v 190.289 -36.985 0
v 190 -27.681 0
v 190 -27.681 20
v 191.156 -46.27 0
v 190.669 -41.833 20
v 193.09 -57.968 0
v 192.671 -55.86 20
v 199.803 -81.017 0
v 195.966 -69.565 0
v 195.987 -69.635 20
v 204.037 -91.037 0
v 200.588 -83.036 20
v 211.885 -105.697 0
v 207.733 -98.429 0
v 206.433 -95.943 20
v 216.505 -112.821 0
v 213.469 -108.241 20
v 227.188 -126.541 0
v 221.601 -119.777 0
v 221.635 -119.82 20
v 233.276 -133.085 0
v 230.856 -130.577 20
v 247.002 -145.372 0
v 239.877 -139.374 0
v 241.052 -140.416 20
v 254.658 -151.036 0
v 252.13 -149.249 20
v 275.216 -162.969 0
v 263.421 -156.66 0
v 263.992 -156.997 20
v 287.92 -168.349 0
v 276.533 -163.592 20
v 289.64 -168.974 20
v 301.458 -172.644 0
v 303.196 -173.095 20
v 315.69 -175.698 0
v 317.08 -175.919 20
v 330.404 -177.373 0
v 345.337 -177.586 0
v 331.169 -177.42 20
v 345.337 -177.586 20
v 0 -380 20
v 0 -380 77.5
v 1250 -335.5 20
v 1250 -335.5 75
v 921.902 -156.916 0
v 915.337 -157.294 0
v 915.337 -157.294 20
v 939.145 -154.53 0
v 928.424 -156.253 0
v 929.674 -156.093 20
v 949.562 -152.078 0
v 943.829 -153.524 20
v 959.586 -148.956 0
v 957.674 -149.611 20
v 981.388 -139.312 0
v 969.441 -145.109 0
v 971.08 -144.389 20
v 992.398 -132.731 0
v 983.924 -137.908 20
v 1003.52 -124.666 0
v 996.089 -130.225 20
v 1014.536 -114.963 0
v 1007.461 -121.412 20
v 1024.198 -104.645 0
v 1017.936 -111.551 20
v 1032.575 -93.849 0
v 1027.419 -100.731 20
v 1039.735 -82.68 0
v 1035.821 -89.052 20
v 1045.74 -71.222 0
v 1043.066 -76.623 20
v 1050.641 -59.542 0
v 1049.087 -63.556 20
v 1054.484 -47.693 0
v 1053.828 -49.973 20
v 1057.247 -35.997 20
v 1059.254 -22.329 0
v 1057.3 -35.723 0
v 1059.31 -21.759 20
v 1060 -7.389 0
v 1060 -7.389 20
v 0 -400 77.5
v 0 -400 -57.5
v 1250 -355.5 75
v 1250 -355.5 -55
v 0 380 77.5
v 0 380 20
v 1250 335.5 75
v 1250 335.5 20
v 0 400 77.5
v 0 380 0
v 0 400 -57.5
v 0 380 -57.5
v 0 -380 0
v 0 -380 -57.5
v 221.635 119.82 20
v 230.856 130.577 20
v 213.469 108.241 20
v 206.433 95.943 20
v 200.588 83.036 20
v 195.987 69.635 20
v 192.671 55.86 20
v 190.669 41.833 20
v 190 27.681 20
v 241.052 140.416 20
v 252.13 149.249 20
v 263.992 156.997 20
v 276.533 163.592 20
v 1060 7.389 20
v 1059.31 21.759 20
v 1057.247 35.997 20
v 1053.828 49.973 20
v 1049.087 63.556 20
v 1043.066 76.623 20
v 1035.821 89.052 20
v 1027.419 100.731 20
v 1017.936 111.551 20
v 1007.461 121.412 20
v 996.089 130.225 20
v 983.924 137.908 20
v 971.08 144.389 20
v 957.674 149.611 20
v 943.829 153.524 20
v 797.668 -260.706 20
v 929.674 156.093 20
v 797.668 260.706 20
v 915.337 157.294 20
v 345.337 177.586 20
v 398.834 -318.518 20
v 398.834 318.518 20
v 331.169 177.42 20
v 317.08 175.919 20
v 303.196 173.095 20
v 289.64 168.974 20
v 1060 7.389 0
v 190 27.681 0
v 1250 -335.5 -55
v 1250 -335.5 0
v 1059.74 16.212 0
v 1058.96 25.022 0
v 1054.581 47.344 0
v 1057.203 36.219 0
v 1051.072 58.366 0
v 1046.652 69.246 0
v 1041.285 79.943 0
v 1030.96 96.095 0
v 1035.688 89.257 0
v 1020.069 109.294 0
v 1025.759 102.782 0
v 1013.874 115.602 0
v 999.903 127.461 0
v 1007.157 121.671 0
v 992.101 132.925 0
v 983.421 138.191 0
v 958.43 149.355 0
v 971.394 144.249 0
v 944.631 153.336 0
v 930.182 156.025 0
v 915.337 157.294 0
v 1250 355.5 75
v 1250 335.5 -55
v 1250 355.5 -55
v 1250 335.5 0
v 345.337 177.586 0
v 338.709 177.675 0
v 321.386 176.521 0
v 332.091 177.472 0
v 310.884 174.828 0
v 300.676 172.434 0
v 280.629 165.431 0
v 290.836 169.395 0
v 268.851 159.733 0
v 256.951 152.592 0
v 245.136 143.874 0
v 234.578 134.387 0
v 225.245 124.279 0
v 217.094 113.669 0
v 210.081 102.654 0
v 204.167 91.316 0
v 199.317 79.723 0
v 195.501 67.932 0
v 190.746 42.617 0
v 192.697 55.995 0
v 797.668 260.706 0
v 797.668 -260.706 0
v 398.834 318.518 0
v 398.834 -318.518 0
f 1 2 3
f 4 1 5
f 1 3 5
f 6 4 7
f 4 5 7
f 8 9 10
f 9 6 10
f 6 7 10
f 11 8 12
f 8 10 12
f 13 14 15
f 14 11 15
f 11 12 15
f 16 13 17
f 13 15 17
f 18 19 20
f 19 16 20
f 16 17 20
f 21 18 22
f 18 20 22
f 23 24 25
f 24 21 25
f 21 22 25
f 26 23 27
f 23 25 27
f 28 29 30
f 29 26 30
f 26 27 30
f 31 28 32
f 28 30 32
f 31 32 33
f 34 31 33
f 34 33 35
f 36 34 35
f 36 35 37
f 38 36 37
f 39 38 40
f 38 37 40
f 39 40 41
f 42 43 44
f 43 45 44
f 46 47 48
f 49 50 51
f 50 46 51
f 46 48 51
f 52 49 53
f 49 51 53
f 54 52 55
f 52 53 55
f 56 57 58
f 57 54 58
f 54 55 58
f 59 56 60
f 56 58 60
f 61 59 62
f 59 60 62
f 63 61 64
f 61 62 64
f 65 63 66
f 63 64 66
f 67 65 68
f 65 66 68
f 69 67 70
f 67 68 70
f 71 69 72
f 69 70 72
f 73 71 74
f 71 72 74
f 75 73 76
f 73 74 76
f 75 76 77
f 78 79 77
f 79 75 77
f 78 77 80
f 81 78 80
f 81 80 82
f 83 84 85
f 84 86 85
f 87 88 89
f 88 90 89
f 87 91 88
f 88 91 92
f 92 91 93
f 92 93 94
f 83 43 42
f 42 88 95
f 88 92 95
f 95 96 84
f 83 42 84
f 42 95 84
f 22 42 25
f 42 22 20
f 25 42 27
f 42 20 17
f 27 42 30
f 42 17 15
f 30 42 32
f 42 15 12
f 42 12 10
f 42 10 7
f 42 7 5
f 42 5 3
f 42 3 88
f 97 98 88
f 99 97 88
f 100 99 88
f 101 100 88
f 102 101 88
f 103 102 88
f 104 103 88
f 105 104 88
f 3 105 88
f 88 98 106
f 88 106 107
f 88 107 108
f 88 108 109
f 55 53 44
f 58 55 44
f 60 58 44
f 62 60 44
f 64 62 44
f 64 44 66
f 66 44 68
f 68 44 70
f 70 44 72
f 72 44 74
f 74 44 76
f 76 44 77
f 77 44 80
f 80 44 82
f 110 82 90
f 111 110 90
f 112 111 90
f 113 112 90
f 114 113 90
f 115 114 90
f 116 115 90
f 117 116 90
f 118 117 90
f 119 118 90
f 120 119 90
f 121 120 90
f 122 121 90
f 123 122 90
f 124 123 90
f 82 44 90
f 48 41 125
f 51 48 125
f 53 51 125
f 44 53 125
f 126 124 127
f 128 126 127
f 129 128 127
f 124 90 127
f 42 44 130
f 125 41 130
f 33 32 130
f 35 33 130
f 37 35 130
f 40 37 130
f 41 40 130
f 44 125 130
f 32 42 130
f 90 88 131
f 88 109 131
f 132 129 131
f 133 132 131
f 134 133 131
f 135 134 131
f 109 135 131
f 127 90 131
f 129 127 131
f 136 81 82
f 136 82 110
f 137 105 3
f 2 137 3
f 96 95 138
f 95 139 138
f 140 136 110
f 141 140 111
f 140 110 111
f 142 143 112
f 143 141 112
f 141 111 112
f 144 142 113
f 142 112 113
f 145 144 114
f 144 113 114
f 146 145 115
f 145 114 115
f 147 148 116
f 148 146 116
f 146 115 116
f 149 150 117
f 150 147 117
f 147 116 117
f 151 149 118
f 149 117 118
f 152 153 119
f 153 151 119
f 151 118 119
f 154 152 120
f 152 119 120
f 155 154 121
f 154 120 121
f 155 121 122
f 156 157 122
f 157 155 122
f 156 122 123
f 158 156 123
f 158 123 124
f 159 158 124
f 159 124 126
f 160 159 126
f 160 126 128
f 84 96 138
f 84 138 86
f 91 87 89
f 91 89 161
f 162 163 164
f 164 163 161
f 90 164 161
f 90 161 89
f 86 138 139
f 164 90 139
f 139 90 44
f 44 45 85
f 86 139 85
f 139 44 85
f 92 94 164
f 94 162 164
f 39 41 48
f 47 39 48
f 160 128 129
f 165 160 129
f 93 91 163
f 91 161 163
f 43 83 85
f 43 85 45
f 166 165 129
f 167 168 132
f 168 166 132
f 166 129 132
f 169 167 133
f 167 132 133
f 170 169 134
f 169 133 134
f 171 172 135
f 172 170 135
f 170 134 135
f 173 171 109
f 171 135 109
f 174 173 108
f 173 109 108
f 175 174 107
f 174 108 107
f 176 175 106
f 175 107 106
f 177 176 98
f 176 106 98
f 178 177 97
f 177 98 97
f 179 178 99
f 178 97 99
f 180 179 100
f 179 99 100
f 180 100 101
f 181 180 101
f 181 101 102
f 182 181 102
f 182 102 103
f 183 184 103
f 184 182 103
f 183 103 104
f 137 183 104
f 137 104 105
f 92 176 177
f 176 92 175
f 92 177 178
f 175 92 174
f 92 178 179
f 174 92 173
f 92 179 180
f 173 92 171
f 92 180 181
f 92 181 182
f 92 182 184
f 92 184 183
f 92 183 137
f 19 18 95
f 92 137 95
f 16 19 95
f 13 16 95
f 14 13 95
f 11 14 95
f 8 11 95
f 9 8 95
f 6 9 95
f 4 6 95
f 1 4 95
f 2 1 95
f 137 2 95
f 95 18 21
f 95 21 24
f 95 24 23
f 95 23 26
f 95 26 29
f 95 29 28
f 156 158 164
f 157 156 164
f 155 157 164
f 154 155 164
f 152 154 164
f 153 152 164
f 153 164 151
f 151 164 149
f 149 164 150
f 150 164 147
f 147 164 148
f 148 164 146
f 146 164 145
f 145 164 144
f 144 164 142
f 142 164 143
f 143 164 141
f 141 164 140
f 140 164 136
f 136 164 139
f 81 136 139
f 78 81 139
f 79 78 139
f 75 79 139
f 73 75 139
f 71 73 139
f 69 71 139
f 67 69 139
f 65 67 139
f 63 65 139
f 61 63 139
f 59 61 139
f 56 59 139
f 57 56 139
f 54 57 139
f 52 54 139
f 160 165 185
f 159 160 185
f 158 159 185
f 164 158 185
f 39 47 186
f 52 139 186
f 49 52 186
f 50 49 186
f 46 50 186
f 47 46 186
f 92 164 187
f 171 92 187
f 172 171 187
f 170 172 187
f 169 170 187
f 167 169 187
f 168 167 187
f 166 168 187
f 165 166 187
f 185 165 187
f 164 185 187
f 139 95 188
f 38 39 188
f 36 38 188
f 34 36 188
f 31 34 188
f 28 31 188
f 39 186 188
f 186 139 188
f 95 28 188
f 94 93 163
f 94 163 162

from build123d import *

# Parameters (mm, degrees)
CUT_EXTRUDE1_DEPTH = 78.5000001


with BuildPart() as part:
    # Sketch1 → Loft l1 section 0
    with BuildSketch(Plane(origin=(0, 0, 0), x_dir=(0, 0, -1), z_dir=(1, 0, 0))):
        Polygon((-77.5, 400), (57.5, 400), (57.5, 380), (0, 380), (0, -380), (57.5, -380), (57.5, -400), (-77.5, -400), (-77.5, -380), (-20, -380), (-20, 380), (-77.5, 380), align=None)
    # Sketch4 → Loft l1 section 1
    with BuildSketch(Plane(origin=(1250, 0, -1000), x_dir=(0, 0, 1), z_dir=(-1, 0, 0))):
        Polygon((945, 355.5), (1075, 355.5), (1075, 335.5), (1020, 335.5), (1020, -335.5), (1075, -335.5), (1075, -355.5), (945, -355.5), (945, -335.5), (1000, -335.5), (1000, 335.5), (945, 335.5), align=None)
    loft()

    # Sketch6 → Cut-Extrude1 (cut, through all)
    with BuildSketch(Plane.XY.offset(20)):
        with BuildLine():
            Line((345.336619362, -177.585655274), (915.336619362, -157.293655274))
            ThreePointArc((915.336619362, -157.293655274), (1017.936307386, -111.550767286), (1060, -7.38861702))
            Line((1060, -7.38861702), (1060, 7.38861702))
            ThreePointArc((1060, 7.38861702), (1017.936307386, 111.550767286), (915.336619362, 157.293655274))
            Line((915.336619362, 157.293655274), (345.336619362, 177.585655274))
            ThreePointArc((345.336619362, 177.585655274), (235.837849735, 135.616924406), (190, 27.68061702))
            Line((190, 27.68061702), (190, -27.68061702))
            ThreePointArc((190, -27.68061702), (235.837849735, -135.616924406), (345.336619362, -177.585655274))
        make_face()
    extrude(amount=-CUT_EXTRUDE1_DEPTH, mode=Mode.SUBTRACT)


solid = part.part
